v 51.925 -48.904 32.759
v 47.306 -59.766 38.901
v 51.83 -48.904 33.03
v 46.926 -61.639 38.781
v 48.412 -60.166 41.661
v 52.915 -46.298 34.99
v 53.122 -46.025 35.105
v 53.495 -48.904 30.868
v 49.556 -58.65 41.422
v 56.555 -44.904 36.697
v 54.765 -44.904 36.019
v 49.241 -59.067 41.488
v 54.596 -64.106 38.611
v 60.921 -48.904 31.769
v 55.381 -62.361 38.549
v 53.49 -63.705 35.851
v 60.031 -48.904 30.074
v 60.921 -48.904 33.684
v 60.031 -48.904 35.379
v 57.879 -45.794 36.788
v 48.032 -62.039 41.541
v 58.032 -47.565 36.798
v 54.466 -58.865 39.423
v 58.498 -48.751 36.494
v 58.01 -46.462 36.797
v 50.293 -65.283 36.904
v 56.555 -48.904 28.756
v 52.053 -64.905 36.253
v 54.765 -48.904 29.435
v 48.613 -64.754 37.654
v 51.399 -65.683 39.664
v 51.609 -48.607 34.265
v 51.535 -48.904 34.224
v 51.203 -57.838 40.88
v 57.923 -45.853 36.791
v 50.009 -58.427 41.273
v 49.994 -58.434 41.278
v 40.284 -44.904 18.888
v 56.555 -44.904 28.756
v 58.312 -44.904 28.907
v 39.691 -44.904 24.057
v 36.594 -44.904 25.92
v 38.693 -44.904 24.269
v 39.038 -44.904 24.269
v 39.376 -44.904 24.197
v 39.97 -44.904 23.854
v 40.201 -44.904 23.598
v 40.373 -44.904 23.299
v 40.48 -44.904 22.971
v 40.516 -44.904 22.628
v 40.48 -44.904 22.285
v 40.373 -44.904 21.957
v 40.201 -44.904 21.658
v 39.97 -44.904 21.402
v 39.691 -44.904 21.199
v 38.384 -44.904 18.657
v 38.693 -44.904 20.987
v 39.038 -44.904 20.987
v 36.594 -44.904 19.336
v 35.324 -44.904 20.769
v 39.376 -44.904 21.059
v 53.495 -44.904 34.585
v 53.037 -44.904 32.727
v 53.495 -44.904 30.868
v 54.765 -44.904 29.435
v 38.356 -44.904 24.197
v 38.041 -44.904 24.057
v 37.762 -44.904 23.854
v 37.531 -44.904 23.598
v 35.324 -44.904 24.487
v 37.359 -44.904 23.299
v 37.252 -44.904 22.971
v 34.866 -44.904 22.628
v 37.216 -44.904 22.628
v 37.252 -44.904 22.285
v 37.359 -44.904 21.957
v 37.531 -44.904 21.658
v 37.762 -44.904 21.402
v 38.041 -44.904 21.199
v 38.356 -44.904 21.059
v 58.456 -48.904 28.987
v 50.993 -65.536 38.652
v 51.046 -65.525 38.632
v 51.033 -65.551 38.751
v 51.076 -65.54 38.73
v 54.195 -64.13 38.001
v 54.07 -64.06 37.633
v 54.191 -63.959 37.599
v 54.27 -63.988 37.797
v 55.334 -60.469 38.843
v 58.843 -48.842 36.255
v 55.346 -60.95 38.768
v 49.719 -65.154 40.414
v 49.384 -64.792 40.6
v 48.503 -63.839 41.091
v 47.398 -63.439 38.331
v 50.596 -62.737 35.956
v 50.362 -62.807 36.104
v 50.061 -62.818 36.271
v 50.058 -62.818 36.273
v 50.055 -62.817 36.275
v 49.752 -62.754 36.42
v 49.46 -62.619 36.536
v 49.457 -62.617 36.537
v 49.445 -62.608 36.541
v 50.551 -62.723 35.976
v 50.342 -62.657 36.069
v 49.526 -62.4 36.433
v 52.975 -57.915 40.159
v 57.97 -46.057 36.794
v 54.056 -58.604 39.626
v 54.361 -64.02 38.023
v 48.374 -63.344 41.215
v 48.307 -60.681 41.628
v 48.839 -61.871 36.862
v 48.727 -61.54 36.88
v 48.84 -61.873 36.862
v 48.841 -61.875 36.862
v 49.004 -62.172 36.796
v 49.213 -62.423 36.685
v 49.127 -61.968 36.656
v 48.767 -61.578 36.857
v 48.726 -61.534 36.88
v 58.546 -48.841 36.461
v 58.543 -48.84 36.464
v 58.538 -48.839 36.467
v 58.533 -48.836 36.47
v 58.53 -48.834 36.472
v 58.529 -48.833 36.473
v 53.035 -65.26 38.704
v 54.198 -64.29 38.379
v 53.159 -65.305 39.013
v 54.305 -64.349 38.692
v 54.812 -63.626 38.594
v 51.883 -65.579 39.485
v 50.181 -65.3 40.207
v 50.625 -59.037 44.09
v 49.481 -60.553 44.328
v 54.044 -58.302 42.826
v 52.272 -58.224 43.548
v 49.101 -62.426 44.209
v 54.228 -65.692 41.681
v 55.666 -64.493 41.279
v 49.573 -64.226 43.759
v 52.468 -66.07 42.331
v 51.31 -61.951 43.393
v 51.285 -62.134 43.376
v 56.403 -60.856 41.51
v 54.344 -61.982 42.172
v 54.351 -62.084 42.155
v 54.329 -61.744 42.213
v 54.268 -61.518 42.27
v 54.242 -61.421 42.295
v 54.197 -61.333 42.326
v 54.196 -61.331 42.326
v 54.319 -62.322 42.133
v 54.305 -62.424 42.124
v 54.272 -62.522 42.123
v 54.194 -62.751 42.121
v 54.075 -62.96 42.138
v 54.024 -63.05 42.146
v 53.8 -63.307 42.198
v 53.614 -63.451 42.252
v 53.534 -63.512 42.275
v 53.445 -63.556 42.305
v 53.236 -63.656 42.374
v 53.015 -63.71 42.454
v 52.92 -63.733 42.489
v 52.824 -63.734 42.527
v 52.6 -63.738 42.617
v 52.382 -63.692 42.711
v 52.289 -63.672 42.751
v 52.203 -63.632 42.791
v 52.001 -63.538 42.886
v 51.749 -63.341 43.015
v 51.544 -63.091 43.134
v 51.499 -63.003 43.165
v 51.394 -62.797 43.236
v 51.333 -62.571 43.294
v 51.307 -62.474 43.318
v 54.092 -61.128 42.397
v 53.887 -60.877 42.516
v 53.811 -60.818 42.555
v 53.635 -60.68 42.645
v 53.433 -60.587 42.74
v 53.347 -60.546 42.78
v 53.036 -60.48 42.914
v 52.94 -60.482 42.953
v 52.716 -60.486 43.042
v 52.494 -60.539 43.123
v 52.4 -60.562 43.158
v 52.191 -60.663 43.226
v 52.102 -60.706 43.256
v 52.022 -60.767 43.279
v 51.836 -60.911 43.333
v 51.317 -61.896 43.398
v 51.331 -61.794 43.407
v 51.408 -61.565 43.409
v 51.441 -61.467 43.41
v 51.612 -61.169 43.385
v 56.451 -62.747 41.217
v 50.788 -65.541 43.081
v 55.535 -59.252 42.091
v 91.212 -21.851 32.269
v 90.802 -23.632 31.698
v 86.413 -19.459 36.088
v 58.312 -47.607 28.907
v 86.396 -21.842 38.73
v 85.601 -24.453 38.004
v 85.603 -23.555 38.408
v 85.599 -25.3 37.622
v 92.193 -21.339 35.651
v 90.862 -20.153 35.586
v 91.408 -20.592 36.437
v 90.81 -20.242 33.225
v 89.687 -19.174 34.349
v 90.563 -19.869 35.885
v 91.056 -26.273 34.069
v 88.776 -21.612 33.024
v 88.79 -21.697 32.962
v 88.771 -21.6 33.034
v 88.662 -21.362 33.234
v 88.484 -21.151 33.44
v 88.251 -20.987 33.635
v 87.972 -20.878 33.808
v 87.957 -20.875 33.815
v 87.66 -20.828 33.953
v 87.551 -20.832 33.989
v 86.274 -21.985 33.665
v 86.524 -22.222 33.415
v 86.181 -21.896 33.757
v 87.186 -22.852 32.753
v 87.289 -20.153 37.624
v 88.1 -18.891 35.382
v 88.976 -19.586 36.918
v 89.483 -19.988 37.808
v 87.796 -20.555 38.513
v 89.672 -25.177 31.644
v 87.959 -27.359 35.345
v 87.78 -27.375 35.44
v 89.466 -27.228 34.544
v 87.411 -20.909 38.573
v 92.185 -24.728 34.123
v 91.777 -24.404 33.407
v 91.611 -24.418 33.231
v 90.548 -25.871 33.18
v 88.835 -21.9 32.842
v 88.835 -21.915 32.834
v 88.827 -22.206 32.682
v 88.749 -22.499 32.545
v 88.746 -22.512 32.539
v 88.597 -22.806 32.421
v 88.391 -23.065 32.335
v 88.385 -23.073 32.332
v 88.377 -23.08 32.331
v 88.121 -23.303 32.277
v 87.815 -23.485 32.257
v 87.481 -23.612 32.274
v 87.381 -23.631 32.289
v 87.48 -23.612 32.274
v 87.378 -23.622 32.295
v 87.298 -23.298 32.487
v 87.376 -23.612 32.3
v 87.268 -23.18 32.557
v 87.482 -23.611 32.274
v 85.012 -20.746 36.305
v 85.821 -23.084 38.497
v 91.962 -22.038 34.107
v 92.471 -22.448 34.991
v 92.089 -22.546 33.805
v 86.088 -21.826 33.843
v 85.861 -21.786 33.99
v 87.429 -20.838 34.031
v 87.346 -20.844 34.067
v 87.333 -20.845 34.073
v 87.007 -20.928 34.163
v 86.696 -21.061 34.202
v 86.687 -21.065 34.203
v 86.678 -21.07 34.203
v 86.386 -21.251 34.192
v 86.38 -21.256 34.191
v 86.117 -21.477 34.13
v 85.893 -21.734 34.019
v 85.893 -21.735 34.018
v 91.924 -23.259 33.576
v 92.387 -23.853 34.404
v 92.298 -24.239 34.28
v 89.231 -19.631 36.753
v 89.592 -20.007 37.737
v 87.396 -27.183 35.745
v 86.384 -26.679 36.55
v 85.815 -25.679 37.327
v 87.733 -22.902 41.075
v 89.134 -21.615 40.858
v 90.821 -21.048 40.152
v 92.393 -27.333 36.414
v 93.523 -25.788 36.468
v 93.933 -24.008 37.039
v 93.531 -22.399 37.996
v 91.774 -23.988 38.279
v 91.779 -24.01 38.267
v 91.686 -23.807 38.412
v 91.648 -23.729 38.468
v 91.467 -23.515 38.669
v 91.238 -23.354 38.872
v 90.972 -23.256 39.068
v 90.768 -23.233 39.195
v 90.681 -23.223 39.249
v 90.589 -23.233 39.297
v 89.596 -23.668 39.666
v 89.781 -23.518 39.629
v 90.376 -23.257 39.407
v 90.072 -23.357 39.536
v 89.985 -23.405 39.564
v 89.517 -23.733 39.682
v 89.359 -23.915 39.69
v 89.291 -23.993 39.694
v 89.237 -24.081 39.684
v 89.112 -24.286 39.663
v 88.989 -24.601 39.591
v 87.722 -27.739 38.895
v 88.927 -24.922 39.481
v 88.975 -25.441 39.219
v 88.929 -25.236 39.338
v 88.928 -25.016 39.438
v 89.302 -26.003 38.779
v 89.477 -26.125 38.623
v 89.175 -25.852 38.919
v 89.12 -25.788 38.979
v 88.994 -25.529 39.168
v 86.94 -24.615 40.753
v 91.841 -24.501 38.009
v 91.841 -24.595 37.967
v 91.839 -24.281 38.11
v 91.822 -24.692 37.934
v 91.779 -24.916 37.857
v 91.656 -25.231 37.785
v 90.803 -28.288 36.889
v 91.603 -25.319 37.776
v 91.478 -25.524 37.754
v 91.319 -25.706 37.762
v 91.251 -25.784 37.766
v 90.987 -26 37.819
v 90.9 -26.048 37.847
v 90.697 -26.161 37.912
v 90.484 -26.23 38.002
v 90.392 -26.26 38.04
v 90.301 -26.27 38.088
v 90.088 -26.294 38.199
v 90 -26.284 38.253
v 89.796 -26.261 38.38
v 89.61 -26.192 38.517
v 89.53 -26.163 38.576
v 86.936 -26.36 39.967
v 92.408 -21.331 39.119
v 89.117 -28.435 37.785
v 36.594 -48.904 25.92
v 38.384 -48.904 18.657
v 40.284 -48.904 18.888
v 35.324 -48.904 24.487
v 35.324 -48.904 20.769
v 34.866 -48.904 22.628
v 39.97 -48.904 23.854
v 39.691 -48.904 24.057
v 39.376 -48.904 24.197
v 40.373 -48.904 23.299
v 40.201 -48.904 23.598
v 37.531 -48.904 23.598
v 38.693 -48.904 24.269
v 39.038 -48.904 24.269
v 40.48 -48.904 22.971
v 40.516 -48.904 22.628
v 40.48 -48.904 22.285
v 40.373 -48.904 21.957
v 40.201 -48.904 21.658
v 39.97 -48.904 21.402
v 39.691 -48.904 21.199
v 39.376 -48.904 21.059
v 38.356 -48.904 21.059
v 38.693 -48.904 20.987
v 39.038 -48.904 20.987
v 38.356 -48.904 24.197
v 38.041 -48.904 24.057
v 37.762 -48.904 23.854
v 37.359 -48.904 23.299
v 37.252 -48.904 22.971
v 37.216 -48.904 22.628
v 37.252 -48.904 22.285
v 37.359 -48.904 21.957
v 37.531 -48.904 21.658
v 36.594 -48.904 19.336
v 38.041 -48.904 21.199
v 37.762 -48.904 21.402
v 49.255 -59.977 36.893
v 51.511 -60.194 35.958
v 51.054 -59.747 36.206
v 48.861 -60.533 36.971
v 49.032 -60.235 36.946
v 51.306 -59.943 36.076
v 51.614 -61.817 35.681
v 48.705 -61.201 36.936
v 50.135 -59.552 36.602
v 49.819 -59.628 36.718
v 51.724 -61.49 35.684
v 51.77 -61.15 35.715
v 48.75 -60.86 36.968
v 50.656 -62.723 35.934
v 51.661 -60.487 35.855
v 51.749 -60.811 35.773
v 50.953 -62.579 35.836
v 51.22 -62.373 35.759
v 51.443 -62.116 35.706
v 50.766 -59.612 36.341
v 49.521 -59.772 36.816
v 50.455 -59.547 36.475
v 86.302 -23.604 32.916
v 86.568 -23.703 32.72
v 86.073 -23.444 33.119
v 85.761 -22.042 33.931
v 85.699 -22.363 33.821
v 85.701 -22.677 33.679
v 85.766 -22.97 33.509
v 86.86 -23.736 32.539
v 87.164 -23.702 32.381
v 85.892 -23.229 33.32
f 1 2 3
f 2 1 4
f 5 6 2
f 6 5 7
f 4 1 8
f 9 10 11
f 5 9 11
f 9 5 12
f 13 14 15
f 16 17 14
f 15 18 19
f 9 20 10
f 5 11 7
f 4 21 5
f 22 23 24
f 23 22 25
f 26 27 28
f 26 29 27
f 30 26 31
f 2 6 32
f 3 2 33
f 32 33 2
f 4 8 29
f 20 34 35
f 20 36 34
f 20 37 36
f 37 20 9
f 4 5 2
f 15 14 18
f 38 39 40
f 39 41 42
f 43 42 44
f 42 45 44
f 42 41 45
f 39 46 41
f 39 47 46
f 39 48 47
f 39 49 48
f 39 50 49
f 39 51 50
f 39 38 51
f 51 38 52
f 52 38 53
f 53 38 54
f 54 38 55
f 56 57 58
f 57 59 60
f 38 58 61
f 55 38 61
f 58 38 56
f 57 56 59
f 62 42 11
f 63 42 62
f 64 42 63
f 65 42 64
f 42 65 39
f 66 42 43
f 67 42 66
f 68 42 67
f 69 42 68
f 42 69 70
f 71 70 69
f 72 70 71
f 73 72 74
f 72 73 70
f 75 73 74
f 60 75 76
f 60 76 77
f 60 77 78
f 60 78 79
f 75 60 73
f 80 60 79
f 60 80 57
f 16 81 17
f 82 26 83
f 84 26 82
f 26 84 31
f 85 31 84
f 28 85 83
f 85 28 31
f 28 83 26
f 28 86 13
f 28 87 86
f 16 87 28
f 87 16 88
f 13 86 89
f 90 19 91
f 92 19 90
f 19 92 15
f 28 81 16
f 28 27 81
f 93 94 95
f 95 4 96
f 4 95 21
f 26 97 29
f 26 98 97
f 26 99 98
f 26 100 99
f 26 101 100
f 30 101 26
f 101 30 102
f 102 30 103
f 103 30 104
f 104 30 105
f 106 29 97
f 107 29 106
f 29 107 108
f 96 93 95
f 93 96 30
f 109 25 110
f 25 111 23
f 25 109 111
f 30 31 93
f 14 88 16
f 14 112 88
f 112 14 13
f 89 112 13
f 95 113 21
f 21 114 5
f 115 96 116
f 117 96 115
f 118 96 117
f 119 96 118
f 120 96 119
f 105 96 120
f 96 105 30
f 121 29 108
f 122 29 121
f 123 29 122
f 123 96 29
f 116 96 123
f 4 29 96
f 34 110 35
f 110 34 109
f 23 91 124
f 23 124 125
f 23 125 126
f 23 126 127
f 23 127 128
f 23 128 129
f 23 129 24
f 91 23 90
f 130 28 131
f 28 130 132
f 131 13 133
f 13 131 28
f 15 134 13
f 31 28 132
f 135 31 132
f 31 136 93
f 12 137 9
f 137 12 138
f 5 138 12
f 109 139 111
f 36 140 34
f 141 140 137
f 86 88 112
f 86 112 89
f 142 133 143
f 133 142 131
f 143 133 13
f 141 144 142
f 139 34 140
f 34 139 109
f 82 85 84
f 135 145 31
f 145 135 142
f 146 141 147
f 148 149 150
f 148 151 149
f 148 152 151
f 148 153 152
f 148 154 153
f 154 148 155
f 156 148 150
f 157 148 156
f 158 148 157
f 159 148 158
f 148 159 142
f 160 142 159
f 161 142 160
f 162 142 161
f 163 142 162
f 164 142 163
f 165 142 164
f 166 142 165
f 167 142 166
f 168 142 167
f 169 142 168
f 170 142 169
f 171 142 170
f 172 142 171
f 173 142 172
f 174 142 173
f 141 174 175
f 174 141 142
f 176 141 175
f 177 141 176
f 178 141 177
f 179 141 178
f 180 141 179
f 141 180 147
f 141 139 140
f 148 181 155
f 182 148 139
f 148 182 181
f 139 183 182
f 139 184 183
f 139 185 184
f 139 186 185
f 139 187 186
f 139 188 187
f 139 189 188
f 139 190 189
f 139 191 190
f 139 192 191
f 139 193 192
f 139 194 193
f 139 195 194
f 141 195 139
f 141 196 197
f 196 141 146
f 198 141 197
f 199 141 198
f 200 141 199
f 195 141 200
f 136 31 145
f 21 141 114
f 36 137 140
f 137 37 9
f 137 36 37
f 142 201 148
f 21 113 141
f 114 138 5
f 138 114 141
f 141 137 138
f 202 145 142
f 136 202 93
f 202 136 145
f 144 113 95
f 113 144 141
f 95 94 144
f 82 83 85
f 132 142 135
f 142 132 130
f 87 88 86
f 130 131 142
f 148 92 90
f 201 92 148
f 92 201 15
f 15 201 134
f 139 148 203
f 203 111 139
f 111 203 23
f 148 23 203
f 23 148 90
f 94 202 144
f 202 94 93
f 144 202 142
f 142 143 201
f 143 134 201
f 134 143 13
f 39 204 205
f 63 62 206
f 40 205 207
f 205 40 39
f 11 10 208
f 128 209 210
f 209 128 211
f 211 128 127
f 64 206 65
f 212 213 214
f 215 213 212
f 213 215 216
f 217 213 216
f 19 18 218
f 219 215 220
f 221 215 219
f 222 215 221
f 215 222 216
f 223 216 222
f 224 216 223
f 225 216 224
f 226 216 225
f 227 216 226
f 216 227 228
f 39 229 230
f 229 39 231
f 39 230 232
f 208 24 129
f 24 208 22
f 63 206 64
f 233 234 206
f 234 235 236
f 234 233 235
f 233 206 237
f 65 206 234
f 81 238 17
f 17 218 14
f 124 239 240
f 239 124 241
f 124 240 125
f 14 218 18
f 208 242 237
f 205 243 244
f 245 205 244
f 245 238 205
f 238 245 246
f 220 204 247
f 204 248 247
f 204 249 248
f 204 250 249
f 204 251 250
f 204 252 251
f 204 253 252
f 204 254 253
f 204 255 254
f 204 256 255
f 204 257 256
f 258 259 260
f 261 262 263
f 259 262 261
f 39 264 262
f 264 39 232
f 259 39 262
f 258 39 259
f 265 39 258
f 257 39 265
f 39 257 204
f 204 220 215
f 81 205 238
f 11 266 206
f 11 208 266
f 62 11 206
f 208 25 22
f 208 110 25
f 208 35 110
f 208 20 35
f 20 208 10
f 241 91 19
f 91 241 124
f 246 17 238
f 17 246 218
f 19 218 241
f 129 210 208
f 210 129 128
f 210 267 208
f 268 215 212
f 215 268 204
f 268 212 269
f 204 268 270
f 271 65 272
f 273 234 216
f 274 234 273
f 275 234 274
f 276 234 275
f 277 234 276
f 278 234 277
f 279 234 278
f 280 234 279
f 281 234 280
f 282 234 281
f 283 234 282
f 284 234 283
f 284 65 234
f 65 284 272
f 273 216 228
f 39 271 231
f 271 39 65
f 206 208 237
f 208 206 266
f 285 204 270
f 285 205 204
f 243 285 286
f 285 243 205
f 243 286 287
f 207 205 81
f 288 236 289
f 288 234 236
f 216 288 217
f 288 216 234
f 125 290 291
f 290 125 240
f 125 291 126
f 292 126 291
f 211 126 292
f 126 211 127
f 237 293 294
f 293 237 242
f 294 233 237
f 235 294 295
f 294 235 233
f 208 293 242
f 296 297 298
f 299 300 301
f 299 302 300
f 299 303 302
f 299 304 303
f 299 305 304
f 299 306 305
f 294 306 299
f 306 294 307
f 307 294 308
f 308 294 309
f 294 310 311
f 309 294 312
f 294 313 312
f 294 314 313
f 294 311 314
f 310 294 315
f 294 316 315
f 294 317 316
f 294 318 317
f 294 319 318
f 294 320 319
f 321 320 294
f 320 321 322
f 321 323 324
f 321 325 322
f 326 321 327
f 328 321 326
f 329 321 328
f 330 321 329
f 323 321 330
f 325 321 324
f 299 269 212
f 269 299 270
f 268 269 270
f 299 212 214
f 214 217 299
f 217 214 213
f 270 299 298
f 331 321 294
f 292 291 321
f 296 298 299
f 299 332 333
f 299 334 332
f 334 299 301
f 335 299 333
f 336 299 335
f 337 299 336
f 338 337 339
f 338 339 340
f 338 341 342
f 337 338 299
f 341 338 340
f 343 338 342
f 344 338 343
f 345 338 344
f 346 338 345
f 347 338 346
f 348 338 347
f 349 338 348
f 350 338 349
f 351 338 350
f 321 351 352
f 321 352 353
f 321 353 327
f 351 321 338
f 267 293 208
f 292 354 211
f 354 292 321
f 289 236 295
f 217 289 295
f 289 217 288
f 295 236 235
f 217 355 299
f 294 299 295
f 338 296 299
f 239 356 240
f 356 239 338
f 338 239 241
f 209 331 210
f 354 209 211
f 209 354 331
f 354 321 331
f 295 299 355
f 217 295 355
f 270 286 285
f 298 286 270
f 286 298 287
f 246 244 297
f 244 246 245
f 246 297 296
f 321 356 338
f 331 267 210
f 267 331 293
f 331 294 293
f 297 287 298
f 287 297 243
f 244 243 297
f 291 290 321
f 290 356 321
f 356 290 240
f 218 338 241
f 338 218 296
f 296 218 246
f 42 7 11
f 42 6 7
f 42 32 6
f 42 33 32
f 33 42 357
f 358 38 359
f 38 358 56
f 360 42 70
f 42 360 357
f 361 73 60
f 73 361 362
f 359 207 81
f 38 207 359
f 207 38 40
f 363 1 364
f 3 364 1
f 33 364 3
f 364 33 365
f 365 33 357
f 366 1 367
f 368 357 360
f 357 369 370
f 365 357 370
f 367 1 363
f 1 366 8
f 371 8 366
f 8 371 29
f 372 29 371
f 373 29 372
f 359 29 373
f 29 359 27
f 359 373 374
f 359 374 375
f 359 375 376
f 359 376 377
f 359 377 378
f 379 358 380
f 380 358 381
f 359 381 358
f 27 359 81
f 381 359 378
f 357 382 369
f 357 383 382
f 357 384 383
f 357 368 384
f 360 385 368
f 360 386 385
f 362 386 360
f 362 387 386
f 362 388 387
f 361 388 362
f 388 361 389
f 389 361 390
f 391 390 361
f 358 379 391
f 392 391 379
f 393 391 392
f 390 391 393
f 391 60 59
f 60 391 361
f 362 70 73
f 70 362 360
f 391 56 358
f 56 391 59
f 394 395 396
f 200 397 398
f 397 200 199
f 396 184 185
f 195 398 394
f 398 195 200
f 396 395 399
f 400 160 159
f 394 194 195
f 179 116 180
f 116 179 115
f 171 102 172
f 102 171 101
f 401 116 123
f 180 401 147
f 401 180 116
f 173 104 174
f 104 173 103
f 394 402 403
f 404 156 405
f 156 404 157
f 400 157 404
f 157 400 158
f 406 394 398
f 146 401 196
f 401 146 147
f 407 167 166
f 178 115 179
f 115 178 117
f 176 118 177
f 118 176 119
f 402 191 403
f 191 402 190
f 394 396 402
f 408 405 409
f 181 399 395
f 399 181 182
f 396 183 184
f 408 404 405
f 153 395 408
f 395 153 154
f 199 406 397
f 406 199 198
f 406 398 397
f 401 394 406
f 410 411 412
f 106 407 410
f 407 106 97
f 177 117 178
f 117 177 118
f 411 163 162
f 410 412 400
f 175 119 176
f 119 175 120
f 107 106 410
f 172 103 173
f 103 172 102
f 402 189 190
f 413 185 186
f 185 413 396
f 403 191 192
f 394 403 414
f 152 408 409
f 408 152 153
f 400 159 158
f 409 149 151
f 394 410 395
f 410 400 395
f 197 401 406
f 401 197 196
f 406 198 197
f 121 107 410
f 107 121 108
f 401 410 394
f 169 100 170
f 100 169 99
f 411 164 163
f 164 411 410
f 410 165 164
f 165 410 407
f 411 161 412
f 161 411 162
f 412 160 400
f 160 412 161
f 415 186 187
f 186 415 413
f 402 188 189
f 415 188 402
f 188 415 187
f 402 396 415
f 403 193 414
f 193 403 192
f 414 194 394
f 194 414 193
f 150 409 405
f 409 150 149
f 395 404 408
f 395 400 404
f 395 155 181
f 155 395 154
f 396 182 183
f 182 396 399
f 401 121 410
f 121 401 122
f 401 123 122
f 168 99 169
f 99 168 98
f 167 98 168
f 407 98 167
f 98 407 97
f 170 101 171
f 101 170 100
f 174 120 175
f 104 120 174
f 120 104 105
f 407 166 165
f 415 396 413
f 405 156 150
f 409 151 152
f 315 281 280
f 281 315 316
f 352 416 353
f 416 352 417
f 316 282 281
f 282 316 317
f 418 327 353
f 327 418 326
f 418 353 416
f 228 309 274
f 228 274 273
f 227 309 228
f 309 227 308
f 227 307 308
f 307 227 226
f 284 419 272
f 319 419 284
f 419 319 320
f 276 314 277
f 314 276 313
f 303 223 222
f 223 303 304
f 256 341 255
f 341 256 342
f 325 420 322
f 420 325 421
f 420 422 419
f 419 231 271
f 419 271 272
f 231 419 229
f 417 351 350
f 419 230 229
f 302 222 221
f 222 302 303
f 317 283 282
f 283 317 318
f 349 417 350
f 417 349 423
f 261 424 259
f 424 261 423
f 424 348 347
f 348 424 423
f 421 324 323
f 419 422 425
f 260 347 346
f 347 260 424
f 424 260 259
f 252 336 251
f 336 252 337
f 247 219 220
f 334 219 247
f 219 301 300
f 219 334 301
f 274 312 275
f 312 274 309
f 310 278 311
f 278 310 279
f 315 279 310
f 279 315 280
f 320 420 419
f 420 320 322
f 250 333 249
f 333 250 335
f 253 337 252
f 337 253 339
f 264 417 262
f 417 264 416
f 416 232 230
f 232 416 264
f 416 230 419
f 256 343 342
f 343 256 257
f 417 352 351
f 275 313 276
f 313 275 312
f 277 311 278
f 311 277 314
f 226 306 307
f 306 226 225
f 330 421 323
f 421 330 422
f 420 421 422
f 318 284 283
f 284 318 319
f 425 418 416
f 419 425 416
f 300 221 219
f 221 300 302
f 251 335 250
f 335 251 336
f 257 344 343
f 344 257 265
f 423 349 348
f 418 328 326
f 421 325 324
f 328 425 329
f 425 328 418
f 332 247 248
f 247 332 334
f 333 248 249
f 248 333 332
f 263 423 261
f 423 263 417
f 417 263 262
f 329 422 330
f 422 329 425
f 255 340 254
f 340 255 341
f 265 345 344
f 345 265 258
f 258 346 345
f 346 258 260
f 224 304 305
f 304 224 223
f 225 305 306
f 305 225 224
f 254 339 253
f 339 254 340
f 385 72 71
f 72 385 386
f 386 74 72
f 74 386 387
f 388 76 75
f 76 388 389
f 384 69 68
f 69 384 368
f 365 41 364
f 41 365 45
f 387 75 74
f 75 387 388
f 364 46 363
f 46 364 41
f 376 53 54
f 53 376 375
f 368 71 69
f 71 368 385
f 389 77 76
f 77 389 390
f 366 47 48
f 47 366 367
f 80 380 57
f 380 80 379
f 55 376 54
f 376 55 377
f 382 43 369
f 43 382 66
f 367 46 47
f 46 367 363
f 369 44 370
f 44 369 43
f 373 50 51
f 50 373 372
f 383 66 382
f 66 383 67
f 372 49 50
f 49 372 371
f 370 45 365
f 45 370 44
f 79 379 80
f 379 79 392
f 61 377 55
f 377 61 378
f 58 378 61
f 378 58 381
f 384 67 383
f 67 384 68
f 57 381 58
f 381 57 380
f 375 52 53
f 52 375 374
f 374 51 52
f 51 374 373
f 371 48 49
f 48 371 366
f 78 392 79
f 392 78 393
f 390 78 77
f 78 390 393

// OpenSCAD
mirror ([-1, 0, 0]) {
  difference () {
    union () {
      hull () {
        translate ([-57.037304979992584, -46.90390227202768, 32.72657997924274]) {
          rotate (a=90.0, v=[1, 0, 0]) {
            cylinder (h=4, r=4, center=true);
          }
        }
        translate ([-22, -36, -3]) {
          translate ([-36.42059678255161, -13.748592644796744, 45.42143047760381]) {
            rotate (a=25.0, v=[0, 0, 1]) {
              rotate (a=-23.000000000000004, v=[0, 1, 0]) {
                rotate (a=-1.9999999999999998, v=[1, 0, 0]) {
                  translate ([0, 0, -4.5]) {
                    translate ([0, -13.575, 0]) {
                      cylinder (h=3, r=4, center=true);
                    }
                  }
                }
              }
            }
          }
        }
      }
      translate ([-22, -36, -3]) {
        translate ([-36.42059678255161, -13.748592644796744, 45.42143047760381]) {
          rotate (a=25.0, v=[0, 0, 1]) {
            rotate (a=-23.000000000000004, v=[0, 1, 0]) {
              rotate (a=-1.9999999999999998, v=[1, 0, 0]) {
                translate ([0, 0, -2.0999999999999996]) {
                  translate ([0, -13.575, 0]) {
                    cylinder (h=4, r=4, center=true);
                  }
                }
              }
            }
          }
        }
      }
      hull () {
        translate ([-57.037304979992584, -46.90390227202768, 32.72657997924274]) {
          rotate (a=90.0, v=[1, 0, 0]) {
            cylinder (h=4, r=4, center=true);
          }
        }
        translate ([-46, -22, -7]) {
          translate ([-36.42059678255161, -13.748592644796744, 45.42143047760381]) {
            rotate (a=34.99999999999999, v=[0, 0, 1]) {
              rotate (a=-36.0, v=[0, 1, 0]) {
                rotate (a=1.9999999999999998, v=[1, 0, 0]) {
                  translate ([0, 0, -4.5]) {
                    translate ([0, 13.575, 0]) {
                      cylinder (h=3, r=4, center=true);
                    }
                  }
                }
              }
            }
          }
        }
      }
      translate ([-46, -22, -7]) {
        translate ([-36.42059678255161, -13.748592644796744, 45.42143047760381]) {
          rotate (a=34.99999999999999, v=[0, 0, 1]) {
            rotate (a=-36.0, v=[0, 1, 0]) {
              rotate (a=1.9999999999999998, v=[1, 0, 0]) {
                translate ([0, 0, -2.0999999999999996]) {
                  translate ([0, 13.575, 0]) {
                    cylinder (h=4, r=4, center=true);
                  }
                }
              }
            }
          }
        }
      }
      hull () {
        translate ([-57.037304979992584, -46.90390227202768, 32.72657997924274]) {
          rotate (a=90.0, v=[1, 0, 0]) {
            cylinder (h=4, r=4, center=true);
          }
        }
        translate ([0, 4, 0]) {
          translate ([-38.86596295863632, -50.90390227202768, 22.628112637472807]) {
            rotate (a=90.0, v=[1, 0, 0]) {
              cylinder (h=4, r=4, center=true);
            }
          }
        }
      }
    }
    union () {
      translate ([-22, -36, -3]) {
        translate ([-36.42059678255161, -13.748592644796744, 45.42143047760381]) {
          rotate (a=25.0, v=[0, 0, 1]) {
            rotate (a=-23.000000000000004, v=[0, 1, 0]) {
              rotate (a=-1.9999999999999998, v=[1, 0, 0]) {
                translate ([0, 0, -2.0999999999999996]) {
                  translate ([0, -13.575, 0]) {
                    cylinder ($fn=30, h=10, r=1.65, center=true);
                  }
                }
              }
            }
          }
        }
      }
      translate ([-46, -22, -7]) {
        translate ([-36.42059678255161, -13.748592644796744, 45.42143047760381]) {
          rotate (a=34.99999999999999, v=[0, 0, 1]) {
            rotate (a=-36.0, v=[0, 1, 0]) {
              rotate (a=1.9999999999999998, v=[1, 0, 0]) {
                translate ([0, 0, -2.0999999999999996]) {
                  translate ([0, 13.575, 0]) {
                    cylinder ($fn=30, h=10, r=1.65, center=true);
                  }
                }
              }
            }
          }
        }
      }
      translate ([-38.86596295863632, -50.90390227202768, 22.628112637472807]) {
        rotate (a=90.0, v=[1, 0, 0]) {
          cylinder ($fn=30, h=20, r=1.65, center=true);
        }
      }
    }
  }
}
